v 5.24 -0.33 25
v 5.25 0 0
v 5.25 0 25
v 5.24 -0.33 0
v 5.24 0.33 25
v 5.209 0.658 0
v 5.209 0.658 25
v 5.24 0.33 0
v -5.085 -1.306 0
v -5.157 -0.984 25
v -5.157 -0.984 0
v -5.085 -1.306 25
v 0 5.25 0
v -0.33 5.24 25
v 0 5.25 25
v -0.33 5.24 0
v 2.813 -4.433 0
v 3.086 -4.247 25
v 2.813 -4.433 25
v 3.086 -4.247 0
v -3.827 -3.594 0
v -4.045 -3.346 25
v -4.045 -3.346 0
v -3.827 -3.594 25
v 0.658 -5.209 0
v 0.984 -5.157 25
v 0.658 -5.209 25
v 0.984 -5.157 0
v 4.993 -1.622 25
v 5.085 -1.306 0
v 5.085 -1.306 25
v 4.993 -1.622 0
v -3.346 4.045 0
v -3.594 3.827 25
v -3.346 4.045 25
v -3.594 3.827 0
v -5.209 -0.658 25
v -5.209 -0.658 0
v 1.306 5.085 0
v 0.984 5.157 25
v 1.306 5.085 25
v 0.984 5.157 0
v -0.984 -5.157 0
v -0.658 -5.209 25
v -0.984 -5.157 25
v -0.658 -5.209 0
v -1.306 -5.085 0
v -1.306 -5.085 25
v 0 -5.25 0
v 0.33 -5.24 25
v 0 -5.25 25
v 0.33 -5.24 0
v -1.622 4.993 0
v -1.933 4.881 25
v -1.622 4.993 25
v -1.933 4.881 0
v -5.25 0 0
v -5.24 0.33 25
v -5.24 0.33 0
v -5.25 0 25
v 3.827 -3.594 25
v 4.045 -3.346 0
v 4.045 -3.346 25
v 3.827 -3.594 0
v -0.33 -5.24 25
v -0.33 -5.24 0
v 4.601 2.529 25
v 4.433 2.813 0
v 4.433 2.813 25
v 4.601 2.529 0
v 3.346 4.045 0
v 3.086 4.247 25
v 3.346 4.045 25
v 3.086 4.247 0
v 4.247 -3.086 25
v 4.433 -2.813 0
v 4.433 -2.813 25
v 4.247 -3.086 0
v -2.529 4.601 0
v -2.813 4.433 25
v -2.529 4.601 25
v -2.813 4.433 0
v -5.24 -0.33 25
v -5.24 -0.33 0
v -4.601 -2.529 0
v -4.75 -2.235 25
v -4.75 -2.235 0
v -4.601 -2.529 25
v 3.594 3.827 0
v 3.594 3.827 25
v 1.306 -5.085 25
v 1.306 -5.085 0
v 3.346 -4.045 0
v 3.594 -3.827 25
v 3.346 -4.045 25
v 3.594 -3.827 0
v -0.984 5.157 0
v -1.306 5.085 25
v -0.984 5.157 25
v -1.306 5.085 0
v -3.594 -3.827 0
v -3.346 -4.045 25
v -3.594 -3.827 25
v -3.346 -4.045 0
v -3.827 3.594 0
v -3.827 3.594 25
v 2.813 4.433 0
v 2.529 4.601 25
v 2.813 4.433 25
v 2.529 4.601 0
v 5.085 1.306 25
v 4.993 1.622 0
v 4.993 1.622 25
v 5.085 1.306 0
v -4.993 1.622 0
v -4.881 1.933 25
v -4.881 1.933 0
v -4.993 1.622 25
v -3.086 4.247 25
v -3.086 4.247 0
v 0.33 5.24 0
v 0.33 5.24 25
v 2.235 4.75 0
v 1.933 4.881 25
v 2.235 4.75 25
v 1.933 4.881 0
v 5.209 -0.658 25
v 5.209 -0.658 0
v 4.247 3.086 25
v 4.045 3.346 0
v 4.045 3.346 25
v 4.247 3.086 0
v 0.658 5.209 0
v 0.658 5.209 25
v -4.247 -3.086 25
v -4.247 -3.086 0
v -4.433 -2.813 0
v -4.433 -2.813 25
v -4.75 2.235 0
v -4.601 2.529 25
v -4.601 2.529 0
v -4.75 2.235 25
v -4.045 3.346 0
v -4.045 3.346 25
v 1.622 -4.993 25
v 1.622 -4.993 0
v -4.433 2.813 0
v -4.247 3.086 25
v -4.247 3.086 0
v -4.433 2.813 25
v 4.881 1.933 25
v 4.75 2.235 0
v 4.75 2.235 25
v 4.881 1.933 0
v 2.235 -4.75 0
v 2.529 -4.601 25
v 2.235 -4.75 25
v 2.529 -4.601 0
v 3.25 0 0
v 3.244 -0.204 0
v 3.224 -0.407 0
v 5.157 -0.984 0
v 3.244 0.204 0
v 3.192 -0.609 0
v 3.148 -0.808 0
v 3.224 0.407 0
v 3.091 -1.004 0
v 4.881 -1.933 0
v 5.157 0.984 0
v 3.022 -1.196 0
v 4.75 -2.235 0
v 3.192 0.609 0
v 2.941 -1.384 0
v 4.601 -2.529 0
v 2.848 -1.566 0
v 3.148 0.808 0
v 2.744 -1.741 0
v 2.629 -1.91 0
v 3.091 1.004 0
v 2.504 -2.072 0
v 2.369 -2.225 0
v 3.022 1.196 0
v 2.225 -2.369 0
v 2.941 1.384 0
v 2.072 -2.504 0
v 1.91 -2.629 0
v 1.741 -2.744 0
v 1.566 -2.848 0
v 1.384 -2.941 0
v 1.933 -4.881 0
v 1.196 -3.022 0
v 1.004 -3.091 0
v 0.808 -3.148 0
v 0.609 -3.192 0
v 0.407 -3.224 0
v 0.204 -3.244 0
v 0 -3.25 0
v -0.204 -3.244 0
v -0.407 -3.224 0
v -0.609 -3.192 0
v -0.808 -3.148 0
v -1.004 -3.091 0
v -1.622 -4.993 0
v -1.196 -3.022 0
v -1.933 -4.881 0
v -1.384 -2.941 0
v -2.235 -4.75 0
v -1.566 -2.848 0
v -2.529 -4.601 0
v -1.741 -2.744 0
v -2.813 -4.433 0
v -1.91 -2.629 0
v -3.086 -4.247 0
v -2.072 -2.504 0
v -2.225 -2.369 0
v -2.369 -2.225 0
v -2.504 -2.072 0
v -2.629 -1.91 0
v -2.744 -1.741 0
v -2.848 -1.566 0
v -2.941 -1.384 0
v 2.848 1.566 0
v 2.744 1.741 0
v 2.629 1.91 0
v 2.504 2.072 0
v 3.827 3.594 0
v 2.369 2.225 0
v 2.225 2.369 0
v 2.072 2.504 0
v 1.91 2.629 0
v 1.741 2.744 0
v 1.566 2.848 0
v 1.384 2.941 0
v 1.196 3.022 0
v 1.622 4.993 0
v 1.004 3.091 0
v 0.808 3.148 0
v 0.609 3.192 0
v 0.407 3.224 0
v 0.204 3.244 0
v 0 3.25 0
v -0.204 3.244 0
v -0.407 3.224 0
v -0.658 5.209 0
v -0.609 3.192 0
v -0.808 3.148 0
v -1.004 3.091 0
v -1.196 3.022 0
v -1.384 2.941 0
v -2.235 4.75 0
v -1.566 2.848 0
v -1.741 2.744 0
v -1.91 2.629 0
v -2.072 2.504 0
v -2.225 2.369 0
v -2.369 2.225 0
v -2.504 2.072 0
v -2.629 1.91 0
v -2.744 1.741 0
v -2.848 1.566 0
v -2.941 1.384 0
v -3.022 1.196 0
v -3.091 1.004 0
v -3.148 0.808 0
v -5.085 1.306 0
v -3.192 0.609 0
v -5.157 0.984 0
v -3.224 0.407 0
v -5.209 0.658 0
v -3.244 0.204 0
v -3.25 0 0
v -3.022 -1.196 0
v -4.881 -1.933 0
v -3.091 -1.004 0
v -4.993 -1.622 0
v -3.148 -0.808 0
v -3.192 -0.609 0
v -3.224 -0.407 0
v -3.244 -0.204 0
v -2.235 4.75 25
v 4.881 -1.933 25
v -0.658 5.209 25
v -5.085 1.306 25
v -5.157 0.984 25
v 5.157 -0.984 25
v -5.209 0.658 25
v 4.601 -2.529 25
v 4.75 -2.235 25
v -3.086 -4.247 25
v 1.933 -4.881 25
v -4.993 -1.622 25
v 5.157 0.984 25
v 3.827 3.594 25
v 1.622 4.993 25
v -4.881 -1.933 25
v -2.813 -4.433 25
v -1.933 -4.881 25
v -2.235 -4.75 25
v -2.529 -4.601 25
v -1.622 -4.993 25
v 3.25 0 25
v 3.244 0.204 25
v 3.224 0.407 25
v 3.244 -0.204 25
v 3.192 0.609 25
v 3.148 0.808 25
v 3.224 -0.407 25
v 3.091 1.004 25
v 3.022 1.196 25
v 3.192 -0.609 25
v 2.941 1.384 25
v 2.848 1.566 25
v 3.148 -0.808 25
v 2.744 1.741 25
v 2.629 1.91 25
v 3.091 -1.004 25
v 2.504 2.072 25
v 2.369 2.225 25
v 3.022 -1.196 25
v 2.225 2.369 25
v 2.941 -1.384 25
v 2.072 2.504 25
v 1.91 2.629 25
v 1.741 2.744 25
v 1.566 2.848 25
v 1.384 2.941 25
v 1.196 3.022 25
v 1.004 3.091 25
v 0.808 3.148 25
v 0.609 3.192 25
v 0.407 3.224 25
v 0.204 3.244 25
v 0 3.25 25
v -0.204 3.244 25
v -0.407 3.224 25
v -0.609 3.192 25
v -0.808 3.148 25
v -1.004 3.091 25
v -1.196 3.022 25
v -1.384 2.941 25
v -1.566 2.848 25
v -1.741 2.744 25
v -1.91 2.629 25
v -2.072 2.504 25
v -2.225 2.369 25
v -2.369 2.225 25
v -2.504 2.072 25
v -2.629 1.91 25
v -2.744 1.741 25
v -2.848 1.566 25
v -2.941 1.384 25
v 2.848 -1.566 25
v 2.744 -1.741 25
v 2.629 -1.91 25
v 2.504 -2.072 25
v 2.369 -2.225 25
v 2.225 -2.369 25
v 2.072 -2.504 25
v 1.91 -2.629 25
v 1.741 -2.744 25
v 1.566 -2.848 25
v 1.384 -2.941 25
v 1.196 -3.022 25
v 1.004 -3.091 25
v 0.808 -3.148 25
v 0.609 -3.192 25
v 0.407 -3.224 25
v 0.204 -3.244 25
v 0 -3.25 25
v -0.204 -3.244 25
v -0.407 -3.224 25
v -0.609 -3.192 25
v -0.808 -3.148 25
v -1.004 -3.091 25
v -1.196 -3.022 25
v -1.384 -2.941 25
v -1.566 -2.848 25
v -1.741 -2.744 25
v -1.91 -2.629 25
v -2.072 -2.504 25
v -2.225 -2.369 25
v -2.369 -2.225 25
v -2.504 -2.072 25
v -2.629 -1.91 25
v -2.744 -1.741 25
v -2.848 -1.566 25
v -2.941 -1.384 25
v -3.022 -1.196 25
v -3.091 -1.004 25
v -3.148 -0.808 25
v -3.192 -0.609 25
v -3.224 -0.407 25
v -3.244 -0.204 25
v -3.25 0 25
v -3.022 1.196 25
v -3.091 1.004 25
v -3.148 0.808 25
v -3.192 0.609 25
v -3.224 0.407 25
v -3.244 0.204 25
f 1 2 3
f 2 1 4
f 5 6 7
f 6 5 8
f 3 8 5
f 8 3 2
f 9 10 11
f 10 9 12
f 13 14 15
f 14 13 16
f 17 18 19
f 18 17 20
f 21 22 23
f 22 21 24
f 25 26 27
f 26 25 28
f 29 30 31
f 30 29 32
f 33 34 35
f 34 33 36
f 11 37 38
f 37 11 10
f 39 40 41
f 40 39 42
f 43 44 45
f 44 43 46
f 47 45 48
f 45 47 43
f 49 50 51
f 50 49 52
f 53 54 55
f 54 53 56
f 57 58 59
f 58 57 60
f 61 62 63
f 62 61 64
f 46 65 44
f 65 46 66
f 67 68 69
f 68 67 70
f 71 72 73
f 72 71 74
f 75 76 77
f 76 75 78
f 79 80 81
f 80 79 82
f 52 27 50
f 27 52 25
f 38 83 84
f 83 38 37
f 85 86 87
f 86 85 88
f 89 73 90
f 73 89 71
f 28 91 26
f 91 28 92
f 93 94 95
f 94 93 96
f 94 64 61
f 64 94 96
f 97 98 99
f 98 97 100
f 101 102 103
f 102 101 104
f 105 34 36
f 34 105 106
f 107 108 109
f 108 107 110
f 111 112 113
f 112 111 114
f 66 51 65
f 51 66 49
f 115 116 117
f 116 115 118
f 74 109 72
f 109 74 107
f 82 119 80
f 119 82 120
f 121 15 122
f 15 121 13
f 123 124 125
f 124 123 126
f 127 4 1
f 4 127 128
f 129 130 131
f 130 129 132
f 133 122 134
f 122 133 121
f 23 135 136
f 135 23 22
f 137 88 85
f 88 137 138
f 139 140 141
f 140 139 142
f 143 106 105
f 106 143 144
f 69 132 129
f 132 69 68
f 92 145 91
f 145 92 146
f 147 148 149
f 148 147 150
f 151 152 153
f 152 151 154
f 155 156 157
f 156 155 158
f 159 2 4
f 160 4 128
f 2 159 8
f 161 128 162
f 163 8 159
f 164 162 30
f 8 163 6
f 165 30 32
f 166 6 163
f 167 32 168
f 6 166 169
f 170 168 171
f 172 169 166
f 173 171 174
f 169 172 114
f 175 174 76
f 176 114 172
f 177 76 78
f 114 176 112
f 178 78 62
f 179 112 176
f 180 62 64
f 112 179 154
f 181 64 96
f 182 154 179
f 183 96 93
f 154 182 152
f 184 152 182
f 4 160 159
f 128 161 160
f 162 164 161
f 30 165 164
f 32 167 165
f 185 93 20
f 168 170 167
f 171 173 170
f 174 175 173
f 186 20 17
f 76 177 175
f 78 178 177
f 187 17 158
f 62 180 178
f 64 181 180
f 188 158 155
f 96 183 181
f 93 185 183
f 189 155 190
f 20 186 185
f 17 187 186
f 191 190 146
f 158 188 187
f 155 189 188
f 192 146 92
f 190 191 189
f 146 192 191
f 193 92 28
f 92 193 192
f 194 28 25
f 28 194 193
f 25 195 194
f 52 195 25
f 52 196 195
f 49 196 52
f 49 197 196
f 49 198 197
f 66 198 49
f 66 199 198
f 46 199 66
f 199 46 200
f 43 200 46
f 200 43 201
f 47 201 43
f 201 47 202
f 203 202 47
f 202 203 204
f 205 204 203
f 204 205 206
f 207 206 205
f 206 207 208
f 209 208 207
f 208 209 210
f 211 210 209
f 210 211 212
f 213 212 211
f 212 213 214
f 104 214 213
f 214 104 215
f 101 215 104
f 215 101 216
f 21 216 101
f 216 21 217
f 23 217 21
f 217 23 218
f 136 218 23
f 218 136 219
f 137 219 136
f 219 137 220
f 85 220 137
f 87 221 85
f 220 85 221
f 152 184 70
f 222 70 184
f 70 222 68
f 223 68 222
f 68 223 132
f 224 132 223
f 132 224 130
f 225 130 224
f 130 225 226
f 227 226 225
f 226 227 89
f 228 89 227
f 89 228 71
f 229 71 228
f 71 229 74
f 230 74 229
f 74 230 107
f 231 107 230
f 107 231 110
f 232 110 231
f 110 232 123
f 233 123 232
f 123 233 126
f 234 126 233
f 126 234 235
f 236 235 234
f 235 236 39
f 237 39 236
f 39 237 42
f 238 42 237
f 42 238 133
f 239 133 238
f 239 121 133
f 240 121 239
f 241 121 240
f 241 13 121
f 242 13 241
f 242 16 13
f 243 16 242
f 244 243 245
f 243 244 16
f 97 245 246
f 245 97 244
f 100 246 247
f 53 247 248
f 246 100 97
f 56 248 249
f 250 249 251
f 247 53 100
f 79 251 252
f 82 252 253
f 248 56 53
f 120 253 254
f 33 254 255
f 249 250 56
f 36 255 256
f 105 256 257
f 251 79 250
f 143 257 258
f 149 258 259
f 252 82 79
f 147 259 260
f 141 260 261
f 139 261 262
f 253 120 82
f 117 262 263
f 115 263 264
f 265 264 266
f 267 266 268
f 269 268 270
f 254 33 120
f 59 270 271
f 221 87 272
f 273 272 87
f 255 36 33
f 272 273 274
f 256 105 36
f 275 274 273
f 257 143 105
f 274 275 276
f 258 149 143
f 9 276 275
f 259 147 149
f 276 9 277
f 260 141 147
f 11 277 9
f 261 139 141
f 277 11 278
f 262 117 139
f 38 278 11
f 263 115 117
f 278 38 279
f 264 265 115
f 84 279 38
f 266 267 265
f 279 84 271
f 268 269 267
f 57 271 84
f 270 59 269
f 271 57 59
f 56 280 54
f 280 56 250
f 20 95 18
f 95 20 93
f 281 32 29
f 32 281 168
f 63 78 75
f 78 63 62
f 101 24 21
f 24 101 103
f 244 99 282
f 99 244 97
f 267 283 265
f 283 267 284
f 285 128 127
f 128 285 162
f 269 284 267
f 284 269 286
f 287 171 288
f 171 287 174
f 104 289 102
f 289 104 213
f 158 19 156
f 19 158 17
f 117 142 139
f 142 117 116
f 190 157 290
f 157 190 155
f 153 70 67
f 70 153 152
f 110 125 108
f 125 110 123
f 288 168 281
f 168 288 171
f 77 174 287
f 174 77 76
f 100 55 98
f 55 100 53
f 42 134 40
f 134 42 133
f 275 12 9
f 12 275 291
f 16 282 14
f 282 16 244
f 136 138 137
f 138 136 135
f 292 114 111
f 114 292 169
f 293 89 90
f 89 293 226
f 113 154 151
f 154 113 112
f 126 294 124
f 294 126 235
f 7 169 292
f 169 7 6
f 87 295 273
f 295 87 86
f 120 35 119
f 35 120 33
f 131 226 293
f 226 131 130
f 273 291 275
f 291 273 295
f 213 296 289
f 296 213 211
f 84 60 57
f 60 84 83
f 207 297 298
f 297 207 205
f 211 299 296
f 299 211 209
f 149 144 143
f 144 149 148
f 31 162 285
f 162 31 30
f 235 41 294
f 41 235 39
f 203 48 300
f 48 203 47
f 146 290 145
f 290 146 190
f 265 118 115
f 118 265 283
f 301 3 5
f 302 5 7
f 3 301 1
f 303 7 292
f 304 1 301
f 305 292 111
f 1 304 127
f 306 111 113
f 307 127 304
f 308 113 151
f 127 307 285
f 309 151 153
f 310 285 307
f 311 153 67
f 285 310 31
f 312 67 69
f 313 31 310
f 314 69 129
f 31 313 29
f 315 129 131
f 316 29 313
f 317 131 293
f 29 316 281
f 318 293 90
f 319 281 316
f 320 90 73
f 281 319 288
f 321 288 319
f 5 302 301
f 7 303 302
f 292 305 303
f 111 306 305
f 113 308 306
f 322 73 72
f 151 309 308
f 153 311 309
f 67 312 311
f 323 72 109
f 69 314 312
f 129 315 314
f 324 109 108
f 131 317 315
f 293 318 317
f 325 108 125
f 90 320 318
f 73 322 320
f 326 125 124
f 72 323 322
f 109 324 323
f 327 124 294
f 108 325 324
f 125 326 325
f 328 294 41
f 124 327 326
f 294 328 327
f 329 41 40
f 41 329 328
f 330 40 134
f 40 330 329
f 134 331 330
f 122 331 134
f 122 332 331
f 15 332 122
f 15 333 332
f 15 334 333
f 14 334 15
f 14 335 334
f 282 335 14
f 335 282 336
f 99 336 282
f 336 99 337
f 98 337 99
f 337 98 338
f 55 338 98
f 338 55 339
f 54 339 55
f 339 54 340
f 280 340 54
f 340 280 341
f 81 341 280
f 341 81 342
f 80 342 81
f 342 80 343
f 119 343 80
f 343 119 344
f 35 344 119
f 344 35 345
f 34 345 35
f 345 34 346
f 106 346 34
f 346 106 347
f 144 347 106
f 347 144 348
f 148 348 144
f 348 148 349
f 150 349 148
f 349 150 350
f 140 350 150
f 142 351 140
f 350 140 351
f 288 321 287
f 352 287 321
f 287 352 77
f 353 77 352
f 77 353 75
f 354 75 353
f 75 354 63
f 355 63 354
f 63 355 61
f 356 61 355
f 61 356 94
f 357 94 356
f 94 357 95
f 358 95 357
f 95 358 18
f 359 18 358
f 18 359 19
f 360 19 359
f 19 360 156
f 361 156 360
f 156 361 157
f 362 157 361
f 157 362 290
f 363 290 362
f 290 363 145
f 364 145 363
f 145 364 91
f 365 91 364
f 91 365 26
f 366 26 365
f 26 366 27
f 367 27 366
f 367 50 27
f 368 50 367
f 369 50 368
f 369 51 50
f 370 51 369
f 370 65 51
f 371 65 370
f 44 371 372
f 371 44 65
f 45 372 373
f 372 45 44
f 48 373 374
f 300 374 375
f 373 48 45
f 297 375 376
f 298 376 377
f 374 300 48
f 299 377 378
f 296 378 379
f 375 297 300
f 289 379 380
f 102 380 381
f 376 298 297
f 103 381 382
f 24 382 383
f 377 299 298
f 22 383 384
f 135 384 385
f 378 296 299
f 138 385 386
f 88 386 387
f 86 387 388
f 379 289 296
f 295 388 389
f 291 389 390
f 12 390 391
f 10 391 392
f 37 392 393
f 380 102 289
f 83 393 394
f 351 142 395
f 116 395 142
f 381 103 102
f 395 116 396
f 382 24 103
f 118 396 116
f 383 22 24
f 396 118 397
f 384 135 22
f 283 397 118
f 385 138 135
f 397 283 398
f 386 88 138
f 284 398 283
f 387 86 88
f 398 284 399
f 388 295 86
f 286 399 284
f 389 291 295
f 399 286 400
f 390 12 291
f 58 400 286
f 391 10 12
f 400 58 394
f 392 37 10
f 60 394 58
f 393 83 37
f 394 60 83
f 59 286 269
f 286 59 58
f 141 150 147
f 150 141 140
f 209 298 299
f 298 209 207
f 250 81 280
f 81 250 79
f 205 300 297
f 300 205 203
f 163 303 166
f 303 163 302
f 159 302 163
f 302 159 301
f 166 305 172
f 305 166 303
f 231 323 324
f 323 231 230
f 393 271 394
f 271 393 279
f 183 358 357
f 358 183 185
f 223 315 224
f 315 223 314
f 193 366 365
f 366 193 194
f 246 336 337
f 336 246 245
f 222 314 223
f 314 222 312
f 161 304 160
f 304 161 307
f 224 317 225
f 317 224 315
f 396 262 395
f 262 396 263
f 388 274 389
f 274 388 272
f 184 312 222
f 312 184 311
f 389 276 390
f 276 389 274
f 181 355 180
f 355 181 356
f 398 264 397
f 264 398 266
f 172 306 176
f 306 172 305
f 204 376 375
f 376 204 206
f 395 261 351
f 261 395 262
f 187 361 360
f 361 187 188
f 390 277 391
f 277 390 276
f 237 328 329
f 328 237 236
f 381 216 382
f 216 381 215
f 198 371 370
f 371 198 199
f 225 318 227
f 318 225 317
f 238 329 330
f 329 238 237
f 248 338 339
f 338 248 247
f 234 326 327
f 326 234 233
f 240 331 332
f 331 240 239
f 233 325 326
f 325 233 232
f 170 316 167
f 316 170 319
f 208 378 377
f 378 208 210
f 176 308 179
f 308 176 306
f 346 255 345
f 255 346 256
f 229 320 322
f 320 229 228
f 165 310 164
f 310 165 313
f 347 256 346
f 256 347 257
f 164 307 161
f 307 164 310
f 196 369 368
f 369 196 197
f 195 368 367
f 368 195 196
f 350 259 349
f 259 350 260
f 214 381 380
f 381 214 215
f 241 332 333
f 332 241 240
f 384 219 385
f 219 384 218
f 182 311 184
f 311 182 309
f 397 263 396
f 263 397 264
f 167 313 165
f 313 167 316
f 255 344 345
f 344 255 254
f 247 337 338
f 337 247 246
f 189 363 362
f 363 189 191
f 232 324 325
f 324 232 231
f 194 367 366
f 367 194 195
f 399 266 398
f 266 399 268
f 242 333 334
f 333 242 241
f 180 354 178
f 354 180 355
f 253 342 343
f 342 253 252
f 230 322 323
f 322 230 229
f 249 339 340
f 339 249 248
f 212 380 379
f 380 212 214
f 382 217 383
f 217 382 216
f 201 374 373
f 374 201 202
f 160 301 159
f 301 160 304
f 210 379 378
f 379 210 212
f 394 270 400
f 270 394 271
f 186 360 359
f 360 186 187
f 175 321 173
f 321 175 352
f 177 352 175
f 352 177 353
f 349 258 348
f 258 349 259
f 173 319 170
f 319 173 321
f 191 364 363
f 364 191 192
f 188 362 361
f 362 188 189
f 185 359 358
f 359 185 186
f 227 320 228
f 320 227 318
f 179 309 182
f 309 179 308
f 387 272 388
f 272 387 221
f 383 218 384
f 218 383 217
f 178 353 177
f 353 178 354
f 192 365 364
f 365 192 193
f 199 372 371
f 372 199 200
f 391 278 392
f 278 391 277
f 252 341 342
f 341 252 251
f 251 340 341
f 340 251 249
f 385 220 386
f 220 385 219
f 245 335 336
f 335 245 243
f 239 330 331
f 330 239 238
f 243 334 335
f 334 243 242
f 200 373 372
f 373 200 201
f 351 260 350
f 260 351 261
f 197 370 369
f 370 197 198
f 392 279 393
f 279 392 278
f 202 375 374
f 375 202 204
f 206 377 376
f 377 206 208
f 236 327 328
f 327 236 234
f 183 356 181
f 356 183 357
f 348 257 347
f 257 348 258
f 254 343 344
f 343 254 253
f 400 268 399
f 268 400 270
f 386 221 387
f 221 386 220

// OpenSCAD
height = 25;
inner_diameter = 6.5;
thickness = 4;
$fn = 100;

difference() {
    cylinder(d = inner_diameter + thickness, h = height);
    cylinder(d = inner_diameter, h = height);
}
